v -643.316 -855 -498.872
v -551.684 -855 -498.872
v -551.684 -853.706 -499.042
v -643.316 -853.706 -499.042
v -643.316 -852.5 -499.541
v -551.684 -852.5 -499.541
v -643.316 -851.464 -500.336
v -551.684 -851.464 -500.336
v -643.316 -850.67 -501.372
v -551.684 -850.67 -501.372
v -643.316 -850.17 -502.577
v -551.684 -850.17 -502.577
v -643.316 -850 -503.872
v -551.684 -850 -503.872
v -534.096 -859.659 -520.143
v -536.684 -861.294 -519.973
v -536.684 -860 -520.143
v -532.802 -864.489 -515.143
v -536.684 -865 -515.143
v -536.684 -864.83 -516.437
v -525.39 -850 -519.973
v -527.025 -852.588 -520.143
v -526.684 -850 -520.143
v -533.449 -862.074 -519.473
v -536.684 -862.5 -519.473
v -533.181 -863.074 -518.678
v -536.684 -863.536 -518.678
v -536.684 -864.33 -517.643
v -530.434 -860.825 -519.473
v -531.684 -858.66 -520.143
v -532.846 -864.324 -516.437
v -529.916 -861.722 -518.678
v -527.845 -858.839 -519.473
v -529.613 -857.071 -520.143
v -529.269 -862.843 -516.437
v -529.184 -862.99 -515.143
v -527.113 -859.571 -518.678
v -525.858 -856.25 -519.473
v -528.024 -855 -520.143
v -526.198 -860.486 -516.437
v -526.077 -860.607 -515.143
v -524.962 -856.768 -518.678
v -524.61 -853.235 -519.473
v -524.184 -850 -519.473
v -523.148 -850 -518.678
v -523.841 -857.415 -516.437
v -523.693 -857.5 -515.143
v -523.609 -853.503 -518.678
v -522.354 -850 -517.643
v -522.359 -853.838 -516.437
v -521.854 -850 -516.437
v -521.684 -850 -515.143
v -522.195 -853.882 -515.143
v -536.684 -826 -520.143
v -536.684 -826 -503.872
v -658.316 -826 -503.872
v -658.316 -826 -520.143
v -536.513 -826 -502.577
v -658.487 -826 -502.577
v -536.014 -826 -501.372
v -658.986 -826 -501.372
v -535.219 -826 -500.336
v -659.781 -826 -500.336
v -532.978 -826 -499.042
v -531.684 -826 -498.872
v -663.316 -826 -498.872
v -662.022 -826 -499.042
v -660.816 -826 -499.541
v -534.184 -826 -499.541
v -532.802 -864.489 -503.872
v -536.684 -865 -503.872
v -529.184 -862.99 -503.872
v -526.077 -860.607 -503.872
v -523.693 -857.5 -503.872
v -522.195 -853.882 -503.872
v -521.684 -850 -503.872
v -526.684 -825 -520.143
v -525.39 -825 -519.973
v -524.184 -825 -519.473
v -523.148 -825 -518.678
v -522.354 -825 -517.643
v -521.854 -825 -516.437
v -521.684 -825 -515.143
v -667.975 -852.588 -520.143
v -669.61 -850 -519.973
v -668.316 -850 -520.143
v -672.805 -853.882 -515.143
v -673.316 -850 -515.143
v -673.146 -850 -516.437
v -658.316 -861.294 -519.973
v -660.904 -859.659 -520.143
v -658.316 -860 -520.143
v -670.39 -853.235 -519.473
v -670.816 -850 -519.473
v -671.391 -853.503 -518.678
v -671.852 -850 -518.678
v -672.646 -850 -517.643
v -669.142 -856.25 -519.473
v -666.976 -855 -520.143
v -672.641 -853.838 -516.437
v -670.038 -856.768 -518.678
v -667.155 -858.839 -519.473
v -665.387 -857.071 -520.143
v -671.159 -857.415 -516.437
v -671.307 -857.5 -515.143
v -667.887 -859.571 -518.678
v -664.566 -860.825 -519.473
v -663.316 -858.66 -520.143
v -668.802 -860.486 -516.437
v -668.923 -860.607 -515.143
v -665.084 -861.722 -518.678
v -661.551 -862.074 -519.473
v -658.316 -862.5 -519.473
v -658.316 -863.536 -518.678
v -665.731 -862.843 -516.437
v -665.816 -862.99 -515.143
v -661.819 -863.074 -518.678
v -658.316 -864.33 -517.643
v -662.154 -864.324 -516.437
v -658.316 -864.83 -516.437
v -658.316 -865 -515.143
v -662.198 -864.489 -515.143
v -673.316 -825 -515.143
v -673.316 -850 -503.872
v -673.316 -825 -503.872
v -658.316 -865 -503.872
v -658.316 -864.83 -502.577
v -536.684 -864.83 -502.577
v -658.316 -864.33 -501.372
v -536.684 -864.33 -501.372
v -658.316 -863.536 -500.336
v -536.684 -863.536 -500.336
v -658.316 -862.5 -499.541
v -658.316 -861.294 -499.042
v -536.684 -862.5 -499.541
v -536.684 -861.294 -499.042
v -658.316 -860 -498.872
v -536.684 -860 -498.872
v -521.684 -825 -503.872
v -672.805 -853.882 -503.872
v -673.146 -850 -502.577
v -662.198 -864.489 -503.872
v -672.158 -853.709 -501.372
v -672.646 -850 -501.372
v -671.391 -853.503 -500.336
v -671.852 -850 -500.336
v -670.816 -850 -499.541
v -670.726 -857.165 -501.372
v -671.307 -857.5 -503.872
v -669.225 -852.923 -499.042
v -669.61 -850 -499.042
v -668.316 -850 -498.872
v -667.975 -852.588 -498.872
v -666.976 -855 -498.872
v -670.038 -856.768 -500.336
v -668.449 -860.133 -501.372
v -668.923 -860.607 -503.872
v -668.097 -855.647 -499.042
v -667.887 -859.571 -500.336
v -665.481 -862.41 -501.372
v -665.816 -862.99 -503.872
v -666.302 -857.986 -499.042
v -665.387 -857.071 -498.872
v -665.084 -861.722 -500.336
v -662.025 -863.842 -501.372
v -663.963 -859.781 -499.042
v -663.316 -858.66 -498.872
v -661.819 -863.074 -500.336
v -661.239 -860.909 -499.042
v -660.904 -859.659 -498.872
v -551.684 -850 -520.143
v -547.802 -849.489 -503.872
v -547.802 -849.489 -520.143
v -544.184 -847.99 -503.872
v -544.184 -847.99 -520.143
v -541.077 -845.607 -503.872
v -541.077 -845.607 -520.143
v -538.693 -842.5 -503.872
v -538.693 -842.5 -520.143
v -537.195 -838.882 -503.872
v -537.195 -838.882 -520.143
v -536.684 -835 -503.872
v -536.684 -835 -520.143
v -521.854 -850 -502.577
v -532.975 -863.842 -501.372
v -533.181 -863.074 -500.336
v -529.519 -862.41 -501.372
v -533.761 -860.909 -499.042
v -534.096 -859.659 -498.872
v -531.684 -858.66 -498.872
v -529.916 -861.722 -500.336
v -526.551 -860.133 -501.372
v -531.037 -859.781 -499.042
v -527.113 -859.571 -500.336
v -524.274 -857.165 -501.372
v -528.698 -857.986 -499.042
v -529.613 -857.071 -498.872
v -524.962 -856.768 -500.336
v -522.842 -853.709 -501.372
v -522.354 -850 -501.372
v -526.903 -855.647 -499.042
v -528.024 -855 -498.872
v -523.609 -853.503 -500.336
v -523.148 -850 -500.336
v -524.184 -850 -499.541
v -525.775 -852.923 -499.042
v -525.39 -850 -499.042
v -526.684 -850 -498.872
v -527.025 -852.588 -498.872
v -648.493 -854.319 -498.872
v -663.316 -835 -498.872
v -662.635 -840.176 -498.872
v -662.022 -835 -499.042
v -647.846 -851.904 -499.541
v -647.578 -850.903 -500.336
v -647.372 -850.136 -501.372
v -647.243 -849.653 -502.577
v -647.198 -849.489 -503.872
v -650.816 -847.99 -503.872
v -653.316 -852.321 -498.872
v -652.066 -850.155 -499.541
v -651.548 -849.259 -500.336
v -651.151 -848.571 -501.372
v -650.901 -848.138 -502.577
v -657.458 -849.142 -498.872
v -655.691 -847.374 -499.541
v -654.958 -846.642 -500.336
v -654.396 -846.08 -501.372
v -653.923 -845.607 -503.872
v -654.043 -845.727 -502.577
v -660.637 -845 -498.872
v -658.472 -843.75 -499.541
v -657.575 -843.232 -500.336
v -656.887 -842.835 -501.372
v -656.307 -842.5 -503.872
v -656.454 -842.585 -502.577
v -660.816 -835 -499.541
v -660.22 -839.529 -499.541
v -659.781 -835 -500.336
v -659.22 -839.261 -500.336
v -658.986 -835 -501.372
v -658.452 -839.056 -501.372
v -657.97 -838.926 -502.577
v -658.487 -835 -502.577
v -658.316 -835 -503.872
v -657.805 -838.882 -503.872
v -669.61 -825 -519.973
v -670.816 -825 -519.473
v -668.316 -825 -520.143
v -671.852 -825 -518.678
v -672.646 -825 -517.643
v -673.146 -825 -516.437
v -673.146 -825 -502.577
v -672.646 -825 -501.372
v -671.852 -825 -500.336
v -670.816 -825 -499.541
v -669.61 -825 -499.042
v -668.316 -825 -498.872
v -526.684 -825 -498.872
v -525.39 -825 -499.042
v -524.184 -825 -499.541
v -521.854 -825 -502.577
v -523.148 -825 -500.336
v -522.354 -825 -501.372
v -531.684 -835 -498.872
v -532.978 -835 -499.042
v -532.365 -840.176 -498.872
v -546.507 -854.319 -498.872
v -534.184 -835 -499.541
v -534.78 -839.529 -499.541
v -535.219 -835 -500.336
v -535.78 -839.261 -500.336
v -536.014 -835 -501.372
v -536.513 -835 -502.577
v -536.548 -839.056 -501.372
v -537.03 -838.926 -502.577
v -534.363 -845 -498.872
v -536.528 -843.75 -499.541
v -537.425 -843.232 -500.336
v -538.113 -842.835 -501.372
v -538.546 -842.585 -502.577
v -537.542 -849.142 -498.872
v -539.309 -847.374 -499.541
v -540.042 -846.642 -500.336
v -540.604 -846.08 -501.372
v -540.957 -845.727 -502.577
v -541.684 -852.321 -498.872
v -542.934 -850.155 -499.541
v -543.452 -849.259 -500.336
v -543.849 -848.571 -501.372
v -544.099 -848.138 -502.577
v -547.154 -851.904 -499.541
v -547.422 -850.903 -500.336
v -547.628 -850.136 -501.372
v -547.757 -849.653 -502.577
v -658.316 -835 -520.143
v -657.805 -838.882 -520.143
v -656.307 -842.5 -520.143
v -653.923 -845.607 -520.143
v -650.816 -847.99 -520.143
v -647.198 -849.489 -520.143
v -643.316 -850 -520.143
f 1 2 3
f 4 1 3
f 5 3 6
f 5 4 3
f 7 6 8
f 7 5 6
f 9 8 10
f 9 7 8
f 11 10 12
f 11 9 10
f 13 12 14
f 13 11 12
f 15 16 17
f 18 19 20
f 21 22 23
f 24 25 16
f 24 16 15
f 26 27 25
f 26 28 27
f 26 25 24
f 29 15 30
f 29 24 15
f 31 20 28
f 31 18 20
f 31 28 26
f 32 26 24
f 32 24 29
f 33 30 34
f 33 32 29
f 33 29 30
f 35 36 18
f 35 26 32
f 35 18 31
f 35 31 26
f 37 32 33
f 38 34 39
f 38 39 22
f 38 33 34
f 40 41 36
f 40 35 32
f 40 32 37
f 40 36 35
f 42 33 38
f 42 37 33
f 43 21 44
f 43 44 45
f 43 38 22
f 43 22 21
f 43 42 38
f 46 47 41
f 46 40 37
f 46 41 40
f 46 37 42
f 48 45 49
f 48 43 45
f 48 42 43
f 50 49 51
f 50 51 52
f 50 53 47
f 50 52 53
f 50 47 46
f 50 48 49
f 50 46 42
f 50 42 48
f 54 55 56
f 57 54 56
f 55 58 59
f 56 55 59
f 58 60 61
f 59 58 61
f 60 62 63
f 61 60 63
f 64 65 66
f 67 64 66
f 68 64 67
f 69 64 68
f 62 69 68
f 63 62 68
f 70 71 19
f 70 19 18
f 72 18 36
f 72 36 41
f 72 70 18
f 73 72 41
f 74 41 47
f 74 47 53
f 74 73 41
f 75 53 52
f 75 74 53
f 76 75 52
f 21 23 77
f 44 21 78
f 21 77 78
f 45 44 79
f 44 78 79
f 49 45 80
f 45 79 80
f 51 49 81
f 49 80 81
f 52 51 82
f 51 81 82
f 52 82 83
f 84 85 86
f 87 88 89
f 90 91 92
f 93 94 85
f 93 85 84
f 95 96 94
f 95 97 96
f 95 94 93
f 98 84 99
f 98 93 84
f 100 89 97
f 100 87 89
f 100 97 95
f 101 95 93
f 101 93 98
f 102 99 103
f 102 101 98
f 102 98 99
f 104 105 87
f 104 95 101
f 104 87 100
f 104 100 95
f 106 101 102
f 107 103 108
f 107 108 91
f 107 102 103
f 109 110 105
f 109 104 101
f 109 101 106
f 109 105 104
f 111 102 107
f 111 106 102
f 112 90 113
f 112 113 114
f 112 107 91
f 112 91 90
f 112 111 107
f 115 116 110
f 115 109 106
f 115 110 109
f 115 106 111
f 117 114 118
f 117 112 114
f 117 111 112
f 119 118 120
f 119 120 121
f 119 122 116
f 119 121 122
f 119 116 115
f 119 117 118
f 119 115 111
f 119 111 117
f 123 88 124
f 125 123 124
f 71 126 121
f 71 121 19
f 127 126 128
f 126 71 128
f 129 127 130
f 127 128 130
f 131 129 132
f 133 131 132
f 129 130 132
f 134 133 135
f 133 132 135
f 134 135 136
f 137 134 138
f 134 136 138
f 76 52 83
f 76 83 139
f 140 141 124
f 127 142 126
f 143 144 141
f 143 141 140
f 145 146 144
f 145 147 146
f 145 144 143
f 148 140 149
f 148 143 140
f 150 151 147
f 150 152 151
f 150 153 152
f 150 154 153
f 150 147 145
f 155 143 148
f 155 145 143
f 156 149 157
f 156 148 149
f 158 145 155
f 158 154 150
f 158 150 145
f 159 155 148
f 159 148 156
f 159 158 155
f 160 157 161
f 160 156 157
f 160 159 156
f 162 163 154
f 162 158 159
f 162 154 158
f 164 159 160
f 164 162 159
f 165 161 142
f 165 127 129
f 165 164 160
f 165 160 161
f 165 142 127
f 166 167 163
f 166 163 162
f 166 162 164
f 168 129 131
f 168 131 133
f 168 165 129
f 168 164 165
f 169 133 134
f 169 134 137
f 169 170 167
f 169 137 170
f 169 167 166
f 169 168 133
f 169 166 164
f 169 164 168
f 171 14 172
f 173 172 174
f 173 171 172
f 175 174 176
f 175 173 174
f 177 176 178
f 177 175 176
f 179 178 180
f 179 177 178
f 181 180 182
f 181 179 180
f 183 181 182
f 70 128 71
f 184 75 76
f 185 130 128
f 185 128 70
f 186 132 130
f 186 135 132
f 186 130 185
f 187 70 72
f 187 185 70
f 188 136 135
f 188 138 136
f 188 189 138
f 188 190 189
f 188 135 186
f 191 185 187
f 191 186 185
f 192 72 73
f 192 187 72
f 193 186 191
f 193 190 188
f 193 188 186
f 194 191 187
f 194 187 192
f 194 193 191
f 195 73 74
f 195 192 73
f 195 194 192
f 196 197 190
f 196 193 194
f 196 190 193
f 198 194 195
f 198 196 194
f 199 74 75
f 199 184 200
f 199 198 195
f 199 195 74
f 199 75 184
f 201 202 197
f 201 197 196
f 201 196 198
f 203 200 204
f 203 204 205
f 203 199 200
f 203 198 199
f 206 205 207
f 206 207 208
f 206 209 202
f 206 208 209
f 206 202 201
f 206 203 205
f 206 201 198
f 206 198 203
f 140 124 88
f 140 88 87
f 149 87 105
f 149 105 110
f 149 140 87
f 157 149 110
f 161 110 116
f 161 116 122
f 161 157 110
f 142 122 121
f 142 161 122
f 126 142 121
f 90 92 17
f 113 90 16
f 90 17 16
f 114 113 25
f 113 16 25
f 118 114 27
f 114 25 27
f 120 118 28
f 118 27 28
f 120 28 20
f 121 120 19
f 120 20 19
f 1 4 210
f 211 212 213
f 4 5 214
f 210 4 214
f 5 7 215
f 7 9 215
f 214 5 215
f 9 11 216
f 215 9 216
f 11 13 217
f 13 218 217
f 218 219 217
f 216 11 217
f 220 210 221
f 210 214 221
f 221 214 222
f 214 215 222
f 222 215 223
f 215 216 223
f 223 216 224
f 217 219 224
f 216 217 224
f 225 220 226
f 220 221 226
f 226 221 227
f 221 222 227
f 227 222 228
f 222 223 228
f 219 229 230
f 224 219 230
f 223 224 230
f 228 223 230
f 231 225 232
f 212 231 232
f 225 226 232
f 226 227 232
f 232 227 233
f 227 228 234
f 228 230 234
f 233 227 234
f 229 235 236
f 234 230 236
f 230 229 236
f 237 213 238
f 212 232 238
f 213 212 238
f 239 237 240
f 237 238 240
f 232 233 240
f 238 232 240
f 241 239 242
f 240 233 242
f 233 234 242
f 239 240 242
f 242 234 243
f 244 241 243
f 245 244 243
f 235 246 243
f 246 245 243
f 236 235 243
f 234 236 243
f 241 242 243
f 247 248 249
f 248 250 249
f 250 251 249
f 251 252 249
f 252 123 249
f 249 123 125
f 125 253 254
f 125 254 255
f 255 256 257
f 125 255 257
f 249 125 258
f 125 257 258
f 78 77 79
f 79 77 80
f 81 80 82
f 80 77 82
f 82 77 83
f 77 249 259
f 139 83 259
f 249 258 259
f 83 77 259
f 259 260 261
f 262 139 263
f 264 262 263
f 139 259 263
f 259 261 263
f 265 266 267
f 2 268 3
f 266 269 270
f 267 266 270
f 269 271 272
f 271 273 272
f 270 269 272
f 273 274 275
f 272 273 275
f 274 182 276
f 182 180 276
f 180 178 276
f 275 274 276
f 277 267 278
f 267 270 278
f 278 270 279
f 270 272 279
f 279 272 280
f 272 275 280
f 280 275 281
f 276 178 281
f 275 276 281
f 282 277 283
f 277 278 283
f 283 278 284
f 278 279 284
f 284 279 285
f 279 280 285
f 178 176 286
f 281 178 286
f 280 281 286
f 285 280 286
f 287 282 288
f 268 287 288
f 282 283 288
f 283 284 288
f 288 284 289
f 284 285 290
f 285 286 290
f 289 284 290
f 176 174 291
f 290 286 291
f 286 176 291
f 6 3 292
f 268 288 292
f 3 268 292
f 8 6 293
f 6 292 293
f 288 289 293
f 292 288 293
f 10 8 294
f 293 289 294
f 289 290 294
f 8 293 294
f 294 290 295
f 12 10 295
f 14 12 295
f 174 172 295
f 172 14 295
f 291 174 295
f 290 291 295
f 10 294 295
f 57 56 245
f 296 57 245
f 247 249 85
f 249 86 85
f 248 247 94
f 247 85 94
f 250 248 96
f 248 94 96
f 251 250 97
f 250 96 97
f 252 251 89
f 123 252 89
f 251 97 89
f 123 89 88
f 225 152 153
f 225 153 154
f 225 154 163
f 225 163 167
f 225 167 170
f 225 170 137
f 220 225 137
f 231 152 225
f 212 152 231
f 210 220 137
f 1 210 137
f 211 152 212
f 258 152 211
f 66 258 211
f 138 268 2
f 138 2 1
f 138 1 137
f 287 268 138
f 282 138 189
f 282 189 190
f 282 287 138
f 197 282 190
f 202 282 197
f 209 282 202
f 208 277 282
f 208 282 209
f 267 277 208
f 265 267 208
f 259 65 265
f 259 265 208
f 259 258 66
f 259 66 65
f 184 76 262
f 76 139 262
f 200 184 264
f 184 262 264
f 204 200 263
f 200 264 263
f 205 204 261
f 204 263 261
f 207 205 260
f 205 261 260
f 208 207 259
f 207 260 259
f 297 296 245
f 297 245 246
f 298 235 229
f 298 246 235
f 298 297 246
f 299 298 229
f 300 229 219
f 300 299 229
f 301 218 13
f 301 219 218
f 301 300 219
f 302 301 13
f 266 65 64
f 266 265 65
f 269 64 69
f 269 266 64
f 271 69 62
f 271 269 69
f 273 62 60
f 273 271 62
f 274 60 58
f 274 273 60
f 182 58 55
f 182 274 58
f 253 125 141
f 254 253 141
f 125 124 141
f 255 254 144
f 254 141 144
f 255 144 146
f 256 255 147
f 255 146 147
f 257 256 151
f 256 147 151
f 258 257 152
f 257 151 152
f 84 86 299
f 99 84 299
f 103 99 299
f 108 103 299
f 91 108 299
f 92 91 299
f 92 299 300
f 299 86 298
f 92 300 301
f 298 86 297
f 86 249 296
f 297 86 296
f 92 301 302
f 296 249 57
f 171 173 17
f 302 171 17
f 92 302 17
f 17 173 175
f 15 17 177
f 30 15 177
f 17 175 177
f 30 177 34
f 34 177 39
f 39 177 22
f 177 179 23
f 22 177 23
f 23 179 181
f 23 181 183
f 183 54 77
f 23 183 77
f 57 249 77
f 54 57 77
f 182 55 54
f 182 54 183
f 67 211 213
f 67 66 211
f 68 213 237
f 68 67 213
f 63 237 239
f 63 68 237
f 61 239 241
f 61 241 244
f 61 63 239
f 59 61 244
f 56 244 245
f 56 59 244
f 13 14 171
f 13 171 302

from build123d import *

# Parameters (mm, degrees)
SKETCH014_W     = 151.632408
SKETCH014_H     = 21.2714
PAD009_DEPTH    = 40
SKETCH015_W     = 121.632408
SKETCH015_H     = 24
POCKET005_DEPTH = 21.2724
FILLET006_R     = 15
FILLET007_R     = 5


with BuildPart() as part:
    # Sketch014 (on Face1 of CopyPocket004) → Pad009 (new body)
    with BuildSketch(Plane.XZ.offset(825)):
        with Locations((-597.5, -509.507206)):
            Rectangle(SKETCH014_W, SKETCH014_H)
    extrude(amount=PAD009_DEPTH)

    # Sketch015 (on Face4 of Pad009) → Pocket005 (cut, through all)
    with BuildSketch(Plane(origin=(0, 0, -498.871506), x_dir=(-1, 0, 0), z_dir=(0, 0, 1))):
        with Locations((597.5, 838)):
            Rectangle(SKETCH015_W, SKETCH015_H)
    extrude(amount=-POCKET005_DEPTH, mode=Mode.SUBTRACT)

    # Fillet006
    fillet006_edges = [part.edges().sort_by_distance(p)[0] for p in [
        (-658.316204, -850, -509.507206),
        (-536.683796, -850, -509.507206),
        (-673.316204, -865, -509.507206),
        (-521.683796, -865, -509.507206),
    ]]
    fillet(fillet006_edges, radius=FILLET006_R)

    # Fillet007
    fillet007_edges = [part.edges().sort_by_distance(p)[0] for p in [
        (-597.5, -850, -498.871506),
        (-673.316204, -837.5, -498.871506),
        (-597.5, -865, -520.142906),
        (-673.316204, -837.5, -520.142906),
    ]]
    fillet(fillet007_edges, radius=FILLET007_R)


solid = part.part
